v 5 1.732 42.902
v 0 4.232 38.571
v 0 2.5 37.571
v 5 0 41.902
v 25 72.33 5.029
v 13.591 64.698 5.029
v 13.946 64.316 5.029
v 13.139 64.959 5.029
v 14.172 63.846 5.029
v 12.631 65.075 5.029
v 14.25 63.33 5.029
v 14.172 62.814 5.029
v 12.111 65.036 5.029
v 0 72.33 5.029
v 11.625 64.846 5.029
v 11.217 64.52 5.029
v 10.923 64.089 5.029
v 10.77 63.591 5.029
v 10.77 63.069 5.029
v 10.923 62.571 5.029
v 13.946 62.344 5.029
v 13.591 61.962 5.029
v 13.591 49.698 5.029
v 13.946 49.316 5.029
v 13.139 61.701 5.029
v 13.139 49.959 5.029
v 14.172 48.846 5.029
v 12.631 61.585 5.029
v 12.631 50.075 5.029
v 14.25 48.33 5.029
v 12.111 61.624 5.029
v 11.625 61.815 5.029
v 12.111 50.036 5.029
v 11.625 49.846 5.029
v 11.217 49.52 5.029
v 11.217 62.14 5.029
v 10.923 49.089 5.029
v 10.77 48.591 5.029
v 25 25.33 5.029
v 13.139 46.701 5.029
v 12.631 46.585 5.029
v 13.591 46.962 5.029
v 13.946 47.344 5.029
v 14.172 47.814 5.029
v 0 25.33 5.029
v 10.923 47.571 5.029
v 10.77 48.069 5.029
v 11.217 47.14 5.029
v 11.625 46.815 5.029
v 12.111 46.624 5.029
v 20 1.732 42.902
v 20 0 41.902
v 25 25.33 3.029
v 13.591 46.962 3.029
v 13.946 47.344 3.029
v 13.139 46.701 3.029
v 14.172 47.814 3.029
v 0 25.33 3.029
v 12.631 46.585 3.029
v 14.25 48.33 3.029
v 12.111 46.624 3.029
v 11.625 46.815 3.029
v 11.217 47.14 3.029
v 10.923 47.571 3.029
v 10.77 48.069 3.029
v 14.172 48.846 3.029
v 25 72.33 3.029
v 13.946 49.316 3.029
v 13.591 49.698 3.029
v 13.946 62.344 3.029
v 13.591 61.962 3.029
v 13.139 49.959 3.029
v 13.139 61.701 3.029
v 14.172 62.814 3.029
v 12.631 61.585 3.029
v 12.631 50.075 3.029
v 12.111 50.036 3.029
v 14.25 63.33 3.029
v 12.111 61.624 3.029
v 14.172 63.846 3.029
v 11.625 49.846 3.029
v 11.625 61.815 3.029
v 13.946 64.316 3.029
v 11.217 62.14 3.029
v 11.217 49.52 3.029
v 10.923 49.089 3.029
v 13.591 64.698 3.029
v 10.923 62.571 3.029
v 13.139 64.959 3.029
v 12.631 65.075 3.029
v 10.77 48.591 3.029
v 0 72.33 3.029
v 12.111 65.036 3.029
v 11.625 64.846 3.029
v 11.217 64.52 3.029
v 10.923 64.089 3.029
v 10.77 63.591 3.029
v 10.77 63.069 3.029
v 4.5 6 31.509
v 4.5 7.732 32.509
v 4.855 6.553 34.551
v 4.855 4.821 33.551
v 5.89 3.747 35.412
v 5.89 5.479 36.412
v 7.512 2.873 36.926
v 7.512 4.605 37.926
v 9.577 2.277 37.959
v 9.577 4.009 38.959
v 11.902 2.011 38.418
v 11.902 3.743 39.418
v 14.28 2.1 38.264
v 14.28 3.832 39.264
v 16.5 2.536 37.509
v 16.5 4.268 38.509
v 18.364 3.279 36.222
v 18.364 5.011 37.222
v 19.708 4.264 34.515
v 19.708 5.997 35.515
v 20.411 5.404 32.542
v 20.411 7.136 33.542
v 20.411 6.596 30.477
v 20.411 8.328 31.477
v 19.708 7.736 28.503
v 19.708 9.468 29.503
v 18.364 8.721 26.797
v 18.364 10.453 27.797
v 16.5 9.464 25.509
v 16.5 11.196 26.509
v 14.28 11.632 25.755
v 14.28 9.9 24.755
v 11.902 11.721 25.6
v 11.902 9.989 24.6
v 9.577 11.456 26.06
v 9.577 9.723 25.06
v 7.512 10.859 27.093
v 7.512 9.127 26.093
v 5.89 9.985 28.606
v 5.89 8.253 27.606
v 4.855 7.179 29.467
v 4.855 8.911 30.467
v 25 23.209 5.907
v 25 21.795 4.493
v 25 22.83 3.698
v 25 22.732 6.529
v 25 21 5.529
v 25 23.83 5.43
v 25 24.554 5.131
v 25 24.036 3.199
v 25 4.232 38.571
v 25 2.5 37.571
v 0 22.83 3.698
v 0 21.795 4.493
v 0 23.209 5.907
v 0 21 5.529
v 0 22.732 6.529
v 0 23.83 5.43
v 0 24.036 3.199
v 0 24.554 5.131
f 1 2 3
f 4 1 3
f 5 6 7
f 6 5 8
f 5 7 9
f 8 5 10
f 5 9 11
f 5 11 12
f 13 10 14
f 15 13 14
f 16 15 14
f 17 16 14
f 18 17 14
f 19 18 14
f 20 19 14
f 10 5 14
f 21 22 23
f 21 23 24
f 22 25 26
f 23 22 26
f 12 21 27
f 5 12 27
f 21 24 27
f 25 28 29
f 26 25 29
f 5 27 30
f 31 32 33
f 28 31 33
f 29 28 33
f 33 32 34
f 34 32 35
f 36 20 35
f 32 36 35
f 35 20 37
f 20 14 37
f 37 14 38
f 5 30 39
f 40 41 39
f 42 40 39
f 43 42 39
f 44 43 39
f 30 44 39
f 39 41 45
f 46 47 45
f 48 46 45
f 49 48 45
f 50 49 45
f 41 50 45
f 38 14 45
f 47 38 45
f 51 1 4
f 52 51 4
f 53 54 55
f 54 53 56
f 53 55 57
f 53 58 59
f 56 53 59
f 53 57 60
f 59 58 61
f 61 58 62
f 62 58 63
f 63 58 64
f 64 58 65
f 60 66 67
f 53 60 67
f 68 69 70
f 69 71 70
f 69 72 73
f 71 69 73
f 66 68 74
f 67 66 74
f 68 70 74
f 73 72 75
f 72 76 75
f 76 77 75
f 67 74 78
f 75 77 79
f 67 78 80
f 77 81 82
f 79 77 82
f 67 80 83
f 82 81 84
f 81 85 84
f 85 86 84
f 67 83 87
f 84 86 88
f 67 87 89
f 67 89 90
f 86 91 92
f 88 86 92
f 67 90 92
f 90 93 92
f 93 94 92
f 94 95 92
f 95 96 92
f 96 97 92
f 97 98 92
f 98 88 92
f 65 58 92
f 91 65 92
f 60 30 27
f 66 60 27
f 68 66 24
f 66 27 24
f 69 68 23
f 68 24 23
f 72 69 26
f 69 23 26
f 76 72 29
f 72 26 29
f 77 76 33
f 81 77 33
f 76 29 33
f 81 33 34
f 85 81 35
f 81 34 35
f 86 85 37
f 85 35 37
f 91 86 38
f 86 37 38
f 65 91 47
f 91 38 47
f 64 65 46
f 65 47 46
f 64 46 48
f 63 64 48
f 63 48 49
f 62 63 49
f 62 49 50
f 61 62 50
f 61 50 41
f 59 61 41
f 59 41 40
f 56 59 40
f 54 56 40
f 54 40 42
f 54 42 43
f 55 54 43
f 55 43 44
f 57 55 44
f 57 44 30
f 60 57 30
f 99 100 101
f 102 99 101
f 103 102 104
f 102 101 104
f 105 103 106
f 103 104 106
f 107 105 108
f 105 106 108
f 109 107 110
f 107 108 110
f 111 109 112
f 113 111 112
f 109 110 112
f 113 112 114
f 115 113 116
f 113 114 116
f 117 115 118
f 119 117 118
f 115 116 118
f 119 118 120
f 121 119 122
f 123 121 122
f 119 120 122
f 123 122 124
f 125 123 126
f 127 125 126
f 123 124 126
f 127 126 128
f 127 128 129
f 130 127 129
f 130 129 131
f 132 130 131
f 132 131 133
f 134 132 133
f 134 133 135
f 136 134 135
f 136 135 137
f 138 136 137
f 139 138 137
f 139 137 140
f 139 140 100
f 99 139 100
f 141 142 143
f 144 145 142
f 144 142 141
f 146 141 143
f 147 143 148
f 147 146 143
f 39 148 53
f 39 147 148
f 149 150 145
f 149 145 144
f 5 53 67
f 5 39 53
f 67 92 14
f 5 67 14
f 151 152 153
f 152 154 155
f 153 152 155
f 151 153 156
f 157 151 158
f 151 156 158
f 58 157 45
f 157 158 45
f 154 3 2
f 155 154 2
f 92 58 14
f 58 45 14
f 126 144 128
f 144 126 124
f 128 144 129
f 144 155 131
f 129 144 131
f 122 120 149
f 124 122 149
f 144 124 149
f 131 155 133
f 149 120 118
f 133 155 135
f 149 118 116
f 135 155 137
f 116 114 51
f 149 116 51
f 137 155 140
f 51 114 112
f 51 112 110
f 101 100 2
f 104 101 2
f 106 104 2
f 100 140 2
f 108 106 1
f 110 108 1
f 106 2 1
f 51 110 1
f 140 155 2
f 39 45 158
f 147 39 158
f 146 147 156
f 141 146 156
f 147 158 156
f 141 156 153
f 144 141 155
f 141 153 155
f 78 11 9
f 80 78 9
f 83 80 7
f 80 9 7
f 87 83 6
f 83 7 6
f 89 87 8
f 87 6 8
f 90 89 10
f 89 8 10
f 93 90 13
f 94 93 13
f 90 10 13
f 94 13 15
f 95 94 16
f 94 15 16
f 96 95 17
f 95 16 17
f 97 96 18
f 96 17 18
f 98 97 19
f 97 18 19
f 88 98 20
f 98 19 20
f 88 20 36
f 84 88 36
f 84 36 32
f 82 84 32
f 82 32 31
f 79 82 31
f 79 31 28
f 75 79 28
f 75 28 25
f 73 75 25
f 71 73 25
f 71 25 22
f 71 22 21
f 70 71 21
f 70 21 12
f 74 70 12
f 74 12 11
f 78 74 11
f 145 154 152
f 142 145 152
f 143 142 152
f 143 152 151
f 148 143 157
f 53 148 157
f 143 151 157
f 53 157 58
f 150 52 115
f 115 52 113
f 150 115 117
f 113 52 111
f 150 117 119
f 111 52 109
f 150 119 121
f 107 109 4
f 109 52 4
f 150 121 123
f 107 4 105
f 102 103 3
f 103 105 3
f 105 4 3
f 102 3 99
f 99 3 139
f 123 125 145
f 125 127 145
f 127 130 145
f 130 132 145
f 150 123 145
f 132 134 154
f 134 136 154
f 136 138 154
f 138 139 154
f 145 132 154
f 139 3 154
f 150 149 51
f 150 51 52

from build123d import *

# Parameters (mm, degrees)
F1_DEPTH = 25
F2_R     = 8
F3_DEPTH = 25
F4_SIZE  = 5
F5_R     = 1.75
F6_DEPTH = 25


with BuildPart() as f1:
    # F0 (on Right) → F1 (new body)
    with BuildSketch(Plane.YZ):
        with BuildLine():
            Line((1.7320508076, 42.9015853287), (0, 41.9015853287))
            Line((0, 41.9015853287), (21, 5.5285183697))
            ThreePointArc((21, 5.5285183697), (22.8301270189, 3.6983913508), (25.3301270189, 3.0285183697))
            Line((25.3301270189, 3.0285183697), (72.3301270189, 3.0285183697))
            Line((72.3301270189, 3.0285183697), (72.3301270189, 5.0285183697))
            Line((72.3301270189, 5.0285183697), (25.3301270189, 5.0285183697))
            ThreePointArc((25.3301270189, 5.0285183697), (23.8301270189, 5.4304421584), (22.7320508076, 6.5285183697))
            Line((22.7320508076, 6.5285183697), (1.7320508076, 42.9015853287))
        make_face()
    extrude(amount=F1_DEPTH)

    # F2 (on face) → F3 (cut)
    with BuildSketch(Plane(origin=(0, 19.8759694843, 11.4753963322), x_dir=(-1, 0, 0), z_dir=(0, 0.8660254038, 0.5))):
        with Locations((-12.5, 24.2878373535)):
            Circle(F2_R)
    extrude(amount=-F3_DEPTH, mode=Mode.SUBTRACT)

    # F4
    f4_edges = [f1.edges().sort_by_distance(p)[0] for p in [
        (0, 0.866025, 42.401585),
        (25, 0.866025, 42.401585),
    ]]
    chamfer(f4_edges, length=F4_SIZE)

    # F5 (on face) → F6 (cut)
    with BuildSketch(Plane.XY.offset(5.0285183697)):
        with Locations((12.5, 63.3301270189)):
            Circle(F5_R)
        with Locations((12.5, 48.3301270189)):
            Circle(F5_R)
    extrude(amount=-F6_DEPTH, mode=Mode.SUBTRACT)


solid = f1.part
